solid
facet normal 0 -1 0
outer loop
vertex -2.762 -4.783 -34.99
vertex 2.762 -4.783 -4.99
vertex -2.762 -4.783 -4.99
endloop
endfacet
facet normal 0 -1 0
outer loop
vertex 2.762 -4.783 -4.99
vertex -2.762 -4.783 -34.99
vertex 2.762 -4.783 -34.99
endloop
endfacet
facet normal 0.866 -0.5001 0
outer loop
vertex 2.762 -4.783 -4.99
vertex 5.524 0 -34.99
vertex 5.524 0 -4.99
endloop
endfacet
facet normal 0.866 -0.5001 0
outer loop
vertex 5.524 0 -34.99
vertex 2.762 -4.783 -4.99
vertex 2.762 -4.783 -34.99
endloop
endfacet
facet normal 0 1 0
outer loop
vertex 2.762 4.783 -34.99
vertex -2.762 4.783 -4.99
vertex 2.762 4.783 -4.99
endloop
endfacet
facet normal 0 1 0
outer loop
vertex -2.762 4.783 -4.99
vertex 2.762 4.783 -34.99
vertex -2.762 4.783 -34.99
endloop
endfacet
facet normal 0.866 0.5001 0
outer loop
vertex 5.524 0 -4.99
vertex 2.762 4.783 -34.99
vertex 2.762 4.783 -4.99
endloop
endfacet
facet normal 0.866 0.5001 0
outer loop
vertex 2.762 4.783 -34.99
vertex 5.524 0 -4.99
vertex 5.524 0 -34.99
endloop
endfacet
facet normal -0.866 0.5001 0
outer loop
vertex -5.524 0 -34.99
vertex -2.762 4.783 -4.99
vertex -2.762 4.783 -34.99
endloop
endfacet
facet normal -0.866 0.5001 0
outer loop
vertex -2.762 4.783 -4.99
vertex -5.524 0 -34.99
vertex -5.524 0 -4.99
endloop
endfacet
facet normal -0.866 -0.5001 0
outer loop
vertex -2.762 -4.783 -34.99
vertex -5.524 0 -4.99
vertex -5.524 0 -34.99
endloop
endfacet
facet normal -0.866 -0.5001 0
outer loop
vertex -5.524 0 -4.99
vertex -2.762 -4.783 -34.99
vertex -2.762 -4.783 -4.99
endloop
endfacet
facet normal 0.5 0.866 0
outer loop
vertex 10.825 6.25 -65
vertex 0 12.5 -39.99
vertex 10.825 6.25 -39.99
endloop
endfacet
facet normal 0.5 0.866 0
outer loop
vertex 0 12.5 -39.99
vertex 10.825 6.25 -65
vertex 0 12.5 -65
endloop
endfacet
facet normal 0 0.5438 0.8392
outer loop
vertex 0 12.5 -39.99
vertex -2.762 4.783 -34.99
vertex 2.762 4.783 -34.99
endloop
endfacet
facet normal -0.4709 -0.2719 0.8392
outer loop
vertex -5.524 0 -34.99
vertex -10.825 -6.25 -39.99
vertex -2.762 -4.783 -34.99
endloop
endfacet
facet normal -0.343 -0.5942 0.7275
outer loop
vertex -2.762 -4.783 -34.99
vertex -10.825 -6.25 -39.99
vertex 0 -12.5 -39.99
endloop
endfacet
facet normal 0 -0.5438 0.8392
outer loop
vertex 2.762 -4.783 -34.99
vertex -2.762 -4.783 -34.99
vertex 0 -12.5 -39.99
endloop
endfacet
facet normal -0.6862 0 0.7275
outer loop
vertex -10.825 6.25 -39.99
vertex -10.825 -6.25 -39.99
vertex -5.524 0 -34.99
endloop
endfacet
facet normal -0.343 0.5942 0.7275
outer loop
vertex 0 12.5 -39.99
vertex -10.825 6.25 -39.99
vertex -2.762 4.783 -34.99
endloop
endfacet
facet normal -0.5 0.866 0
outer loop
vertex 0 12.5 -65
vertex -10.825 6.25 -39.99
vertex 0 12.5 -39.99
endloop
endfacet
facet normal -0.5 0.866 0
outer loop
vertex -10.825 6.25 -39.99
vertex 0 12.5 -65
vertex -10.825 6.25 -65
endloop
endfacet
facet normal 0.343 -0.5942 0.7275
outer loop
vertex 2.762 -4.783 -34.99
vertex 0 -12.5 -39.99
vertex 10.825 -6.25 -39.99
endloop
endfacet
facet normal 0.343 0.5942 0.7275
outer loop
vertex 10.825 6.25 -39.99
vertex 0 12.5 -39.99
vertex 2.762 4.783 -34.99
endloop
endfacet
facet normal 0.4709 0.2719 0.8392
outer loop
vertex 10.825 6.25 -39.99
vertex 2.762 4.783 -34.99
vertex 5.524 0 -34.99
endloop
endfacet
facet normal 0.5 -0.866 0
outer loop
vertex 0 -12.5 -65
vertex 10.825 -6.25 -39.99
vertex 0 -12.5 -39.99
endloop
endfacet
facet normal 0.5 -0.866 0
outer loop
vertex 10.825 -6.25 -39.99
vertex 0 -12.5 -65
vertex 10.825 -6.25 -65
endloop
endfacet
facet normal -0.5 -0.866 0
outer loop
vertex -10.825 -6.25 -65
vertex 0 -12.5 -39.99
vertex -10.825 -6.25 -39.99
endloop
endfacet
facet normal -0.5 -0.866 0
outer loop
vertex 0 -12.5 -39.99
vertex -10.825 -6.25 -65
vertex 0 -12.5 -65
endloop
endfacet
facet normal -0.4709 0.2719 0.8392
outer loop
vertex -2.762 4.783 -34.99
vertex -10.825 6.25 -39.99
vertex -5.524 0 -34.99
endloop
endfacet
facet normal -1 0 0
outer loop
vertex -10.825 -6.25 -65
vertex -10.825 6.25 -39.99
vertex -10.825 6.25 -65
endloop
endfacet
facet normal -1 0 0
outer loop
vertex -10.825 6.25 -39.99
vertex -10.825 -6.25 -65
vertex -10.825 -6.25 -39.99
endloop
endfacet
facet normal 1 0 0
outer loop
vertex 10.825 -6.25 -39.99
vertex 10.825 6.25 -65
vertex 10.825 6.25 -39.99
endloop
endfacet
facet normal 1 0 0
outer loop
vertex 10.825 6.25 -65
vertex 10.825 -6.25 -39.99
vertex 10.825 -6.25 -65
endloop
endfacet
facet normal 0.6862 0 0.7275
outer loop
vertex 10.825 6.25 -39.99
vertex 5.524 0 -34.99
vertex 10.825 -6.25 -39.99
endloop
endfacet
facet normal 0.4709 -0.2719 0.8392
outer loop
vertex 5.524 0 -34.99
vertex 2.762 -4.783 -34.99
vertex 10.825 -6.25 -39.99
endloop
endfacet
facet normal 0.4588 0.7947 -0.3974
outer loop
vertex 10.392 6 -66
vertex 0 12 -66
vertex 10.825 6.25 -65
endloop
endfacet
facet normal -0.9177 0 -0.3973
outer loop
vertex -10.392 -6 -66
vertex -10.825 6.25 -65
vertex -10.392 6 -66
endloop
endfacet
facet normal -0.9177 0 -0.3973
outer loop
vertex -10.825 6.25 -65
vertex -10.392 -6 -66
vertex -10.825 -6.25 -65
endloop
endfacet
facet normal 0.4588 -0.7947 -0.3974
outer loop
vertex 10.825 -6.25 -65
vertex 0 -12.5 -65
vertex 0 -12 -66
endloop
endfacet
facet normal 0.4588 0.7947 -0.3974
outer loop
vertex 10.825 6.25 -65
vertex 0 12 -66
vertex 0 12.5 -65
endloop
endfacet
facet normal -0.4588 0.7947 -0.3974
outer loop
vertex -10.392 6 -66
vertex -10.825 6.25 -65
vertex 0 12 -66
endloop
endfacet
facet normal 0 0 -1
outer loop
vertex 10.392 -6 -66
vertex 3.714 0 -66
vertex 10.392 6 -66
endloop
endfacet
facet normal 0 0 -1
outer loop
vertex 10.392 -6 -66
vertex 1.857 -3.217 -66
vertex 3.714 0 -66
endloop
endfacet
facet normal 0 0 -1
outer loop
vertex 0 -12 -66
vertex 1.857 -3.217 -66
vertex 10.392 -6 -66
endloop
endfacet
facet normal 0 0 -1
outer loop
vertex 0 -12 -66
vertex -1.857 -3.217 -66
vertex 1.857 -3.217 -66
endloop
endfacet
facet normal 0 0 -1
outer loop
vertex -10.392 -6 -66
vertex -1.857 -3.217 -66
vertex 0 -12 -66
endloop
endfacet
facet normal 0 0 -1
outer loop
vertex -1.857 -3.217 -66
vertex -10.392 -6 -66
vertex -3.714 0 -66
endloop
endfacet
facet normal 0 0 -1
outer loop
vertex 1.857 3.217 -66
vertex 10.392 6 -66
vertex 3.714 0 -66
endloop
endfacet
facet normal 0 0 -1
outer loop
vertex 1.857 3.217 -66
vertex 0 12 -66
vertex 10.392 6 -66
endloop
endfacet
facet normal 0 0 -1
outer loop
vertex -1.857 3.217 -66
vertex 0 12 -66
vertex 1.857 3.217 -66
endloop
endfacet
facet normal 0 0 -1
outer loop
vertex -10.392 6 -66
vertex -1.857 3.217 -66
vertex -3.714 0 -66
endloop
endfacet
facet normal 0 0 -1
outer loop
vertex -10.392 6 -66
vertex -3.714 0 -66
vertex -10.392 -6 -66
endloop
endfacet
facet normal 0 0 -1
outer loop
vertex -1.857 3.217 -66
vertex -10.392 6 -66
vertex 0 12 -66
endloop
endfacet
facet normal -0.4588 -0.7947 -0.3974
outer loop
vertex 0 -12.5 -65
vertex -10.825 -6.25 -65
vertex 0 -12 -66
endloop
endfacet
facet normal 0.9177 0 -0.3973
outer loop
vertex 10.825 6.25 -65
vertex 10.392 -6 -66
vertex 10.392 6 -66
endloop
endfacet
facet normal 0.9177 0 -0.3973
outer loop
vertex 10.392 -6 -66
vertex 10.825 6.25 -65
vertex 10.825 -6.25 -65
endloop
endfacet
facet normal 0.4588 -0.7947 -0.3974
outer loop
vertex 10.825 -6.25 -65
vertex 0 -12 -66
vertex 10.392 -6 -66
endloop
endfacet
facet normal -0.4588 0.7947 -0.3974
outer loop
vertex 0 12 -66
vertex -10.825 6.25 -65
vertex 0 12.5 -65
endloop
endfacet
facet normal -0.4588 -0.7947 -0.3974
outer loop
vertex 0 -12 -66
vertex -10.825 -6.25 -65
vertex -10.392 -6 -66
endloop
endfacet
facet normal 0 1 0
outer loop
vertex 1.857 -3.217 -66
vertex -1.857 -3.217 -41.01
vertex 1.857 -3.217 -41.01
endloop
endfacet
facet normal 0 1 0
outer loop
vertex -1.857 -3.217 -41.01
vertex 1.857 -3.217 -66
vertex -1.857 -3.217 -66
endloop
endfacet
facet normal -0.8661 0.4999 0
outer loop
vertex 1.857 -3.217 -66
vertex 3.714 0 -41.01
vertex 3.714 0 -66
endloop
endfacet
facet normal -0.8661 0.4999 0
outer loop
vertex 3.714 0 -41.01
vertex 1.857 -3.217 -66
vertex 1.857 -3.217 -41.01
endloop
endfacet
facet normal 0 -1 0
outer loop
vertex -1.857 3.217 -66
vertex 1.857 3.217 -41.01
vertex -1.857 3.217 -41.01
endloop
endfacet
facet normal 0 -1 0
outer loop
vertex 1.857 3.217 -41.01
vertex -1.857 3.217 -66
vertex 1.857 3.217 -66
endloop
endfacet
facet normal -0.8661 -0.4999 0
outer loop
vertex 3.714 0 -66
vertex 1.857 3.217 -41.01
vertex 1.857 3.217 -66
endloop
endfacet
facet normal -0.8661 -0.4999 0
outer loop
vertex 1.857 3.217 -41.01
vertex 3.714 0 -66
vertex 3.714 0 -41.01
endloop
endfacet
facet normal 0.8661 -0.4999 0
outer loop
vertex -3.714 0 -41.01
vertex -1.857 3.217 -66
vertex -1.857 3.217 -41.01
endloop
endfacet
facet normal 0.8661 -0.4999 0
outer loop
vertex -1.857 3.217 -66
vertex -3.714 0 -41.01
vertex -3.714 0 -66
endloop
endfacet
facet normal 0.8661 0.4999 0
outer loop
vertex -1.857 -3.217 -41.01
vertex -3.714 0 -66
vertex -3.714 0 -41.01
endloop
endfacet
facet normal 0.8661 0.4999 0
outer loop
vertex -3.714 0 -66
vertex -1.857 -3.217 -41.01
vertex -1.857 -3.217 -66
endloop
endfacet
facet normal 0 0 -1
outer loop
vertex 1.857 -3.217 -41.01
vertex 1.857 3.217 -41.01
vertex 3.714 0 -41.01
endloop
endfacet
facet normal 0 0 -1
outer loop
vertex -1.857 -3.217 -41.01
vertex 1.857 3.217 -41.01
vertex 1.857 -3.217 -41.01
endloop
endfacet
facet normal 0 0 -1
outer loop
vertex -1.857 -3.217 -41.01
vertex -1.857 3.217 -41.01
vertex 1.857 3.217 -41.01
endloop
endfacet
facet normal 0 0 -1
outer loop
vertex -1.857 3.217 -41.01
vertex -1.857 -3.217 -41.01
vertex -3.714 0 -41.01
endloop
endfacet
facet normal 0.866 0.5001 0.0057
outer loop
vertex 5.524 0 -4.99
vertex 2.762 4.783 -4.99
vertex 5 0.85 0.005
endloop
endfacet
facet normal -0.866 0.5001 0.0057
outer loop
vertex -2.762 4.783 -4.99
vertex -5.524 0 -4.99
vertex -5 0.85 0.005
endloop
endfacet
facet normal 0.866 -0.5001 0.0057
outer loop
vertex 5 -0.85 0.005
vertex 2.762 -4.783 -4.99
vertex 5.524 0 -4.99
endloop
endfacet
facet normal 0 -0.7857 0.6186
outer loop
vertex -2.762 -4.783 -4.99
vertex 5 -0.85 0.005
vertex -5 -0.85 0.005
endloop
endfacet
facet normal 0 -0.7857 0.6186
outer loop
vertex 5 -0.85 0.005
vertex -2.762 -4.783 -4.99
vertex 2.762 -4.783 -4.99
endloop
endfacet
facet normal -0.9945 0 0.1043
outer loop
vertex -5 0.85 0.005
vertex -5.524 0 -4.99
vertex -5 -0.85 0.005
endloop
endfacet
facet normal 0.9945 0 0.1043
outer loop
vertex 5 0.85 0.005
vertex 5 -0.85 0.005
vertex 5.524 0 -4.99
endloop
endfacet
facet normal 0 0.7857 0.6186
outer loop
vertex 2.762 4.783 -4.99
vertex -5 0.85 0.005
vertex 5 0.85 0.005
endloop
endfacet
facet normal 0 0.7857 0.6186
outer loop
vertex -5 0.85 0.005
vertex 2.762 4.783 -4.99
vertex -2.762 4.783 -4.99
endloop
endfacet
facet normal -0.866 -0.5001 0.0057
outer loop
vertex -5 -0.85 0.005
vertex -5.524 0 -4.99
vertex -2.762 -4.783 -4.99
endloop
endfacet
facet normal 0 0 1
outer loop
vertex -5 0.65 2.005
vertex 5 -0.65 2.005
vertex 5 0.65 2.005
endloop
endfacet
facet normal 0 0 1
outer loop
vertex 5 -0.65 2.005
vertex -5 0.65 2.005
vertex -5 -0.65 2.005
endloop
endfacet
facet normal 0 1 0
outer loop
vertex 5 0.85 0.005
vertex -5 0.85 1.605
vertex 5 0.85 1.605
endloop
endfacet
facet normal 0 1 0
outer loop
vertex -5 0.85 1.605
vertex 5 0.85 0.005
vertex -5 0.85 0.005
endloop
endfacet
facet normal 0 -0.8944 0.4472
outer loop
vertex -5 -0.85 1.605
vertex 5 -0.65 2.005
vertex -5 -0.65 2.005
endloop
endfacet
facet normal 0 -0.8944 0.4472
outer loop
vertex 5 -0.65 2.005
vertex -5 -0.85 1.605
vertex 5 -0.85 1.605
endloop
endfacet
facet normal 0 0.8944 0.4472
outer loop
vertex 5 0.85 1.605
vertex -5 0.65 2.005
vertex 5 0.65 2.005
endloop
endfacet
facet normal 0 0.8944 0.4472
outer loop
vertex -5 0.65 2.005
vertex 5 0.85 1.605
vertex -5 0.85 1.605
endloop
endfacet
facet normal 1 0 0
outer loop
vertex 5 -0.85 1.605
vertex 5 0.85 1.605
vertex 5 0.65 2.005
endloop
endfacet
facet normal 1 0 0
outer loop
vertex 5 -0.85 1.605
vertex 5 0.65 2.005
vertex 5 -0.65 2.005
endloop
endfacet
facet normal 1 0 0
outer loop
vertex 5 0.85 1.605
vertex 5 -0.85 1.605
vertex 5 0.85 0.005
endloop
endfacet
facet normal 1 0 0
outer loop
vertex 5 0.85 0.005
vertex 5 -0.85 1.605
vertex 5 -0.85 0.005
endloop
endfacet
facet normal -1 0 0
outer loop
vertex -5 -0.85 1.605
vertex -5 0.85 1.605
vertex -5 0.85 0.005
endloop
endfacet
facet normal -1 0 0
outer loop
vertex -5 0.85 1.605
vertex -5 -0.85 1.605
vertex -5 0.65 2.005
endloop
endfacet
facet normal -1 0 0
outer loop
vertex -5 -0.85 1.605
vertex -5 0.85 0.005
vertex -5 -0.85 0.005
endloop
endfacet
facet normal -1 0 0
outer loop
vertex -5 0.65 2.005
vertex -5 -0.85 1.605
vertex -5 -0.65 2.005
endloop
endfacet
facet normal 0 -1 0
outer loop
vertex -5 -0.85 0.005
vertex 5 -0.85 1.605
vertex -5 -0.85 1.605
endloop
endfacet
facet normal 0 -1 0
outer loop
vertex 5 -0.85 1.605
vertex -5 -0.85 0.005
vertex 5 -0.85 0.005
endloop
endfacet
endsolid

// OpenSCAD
// Width of Screwdriver Blade
blade_width = 10;

// Thickness of Screwdriver Blade
blade_thickness = 2.2;

// Length of Screwdriver Blade
blade_length = 2;

// Length of Screwdriver Edge 45 Degrees Taper
blade_taper = 0.4;

// Use this to correct for your printer's oversizing. Set to 0 to get STL file exactly as designed.
printer_oversizing = 0.5;

// Length of Hexagonal Shaft near Blade
hexagonal_shaft_length = 30;

// Wrench Size in mm that fits on Hexagonal Shaft
hexagonal_shaft_wrench_width = 10;

// Size of Allen Key that can be inserted into Handle End
allen_key_width = 6;

// Length of Main Handle
handle_length = 25;

// Diameter of Main Handle
handle_diameter = 25;

// Number of Faces of Main Handle
handle_polygon_faces = 6;

// Length of Transitions between Blade/Hexagonal Shaft/Main Handle
transition_length = 5;

// Constant used for consistent meshing, should not normally be changed.
epsilon = 0.01;

tol = printer_oversizing;

th_blade = blade_thickness  - tol;
l_blade = blade_length - blade_taper;
taper = blade_taper;

l_hexshaft = hexagonal_shaft_length;
w_hexkey = hexagonal_shaft_wrench_width;
l_handle = handle_length;
l_transition = transition_length;
w_key = allen_key_width;

d_handle = handle_diameter;
faces_handle = handle_polygon_faces;

difference ()
{
    union ()
    {
        // Hex Shaft
        translate ([0, 0, -l_hexshaft - l_transition])
                cylinder (h = l_hexshaft, d = w_hexkey/cos (30) - tol, $fn = 6);
        
        // Hex Shaft/Handle Transition
        hull ()
        {
            translate ([0, 0, -l_hexshaft - l_transition])
                cylinder (h = epsilon, d = w_hexkey/cos (30) - tol, $fn = 6);
            
            translate ([0, 0, -l_hexshaft - 2 * l_transition])
                rotate ([0, 0, 180/faces_handle])
                    cylinder (h = epsilon, d = d_handle, $fn = faces_handle);
        }
        
        //Handle
        translate ([0, 0, -l_hexshaft - l_handle - 2 * l_transition])
            rotate ([0, 0, 180/faces_handle])
                cylinder (h = l_handle, d = d_handle, $fn = faces_handle);
        
        // Handle Chamfer
        translate ([0, 0, -l_hexshaft - l_handle - 2* l_transition - 1])
            rotate ([0, 0, 180/faces_handle])
                cylinder (h = 1, d1 = d_handle - 1, d2 = d_handle, $fn = faces_handle);
    }
    
    translate ([0, 0, -l_hexshaft - l_handle - 2 * l_transition - 1 - epsilon])
        cylinder (h = l_handle, d = w_key/cos (30) + tol, $fn = 6);
}

// Blade Chamfer
hull ()
{
    translate ([0, 0, -l_transition])
        cylinder (h = epsilon, d = w_hexkey/cos (30) - tol, $fn = 6);
    
    translate ([0, 0, 0])
        cube ([blade_width, th_blade, epsilon], center = true);
}

// Blade
hull ()
{
    translate ([0, 0, 0])
        cube ([blade_width, th_blade, epsilon], center = true);
    
    translate ([0, 0, l_blade])
        cube ([blade_width, th_blade, epsilon], center = true);
    
    translate ([0, 0, l_blade + taper])
        cube ([blade_width, th_blade - taper, epsilon], center = true);
}
